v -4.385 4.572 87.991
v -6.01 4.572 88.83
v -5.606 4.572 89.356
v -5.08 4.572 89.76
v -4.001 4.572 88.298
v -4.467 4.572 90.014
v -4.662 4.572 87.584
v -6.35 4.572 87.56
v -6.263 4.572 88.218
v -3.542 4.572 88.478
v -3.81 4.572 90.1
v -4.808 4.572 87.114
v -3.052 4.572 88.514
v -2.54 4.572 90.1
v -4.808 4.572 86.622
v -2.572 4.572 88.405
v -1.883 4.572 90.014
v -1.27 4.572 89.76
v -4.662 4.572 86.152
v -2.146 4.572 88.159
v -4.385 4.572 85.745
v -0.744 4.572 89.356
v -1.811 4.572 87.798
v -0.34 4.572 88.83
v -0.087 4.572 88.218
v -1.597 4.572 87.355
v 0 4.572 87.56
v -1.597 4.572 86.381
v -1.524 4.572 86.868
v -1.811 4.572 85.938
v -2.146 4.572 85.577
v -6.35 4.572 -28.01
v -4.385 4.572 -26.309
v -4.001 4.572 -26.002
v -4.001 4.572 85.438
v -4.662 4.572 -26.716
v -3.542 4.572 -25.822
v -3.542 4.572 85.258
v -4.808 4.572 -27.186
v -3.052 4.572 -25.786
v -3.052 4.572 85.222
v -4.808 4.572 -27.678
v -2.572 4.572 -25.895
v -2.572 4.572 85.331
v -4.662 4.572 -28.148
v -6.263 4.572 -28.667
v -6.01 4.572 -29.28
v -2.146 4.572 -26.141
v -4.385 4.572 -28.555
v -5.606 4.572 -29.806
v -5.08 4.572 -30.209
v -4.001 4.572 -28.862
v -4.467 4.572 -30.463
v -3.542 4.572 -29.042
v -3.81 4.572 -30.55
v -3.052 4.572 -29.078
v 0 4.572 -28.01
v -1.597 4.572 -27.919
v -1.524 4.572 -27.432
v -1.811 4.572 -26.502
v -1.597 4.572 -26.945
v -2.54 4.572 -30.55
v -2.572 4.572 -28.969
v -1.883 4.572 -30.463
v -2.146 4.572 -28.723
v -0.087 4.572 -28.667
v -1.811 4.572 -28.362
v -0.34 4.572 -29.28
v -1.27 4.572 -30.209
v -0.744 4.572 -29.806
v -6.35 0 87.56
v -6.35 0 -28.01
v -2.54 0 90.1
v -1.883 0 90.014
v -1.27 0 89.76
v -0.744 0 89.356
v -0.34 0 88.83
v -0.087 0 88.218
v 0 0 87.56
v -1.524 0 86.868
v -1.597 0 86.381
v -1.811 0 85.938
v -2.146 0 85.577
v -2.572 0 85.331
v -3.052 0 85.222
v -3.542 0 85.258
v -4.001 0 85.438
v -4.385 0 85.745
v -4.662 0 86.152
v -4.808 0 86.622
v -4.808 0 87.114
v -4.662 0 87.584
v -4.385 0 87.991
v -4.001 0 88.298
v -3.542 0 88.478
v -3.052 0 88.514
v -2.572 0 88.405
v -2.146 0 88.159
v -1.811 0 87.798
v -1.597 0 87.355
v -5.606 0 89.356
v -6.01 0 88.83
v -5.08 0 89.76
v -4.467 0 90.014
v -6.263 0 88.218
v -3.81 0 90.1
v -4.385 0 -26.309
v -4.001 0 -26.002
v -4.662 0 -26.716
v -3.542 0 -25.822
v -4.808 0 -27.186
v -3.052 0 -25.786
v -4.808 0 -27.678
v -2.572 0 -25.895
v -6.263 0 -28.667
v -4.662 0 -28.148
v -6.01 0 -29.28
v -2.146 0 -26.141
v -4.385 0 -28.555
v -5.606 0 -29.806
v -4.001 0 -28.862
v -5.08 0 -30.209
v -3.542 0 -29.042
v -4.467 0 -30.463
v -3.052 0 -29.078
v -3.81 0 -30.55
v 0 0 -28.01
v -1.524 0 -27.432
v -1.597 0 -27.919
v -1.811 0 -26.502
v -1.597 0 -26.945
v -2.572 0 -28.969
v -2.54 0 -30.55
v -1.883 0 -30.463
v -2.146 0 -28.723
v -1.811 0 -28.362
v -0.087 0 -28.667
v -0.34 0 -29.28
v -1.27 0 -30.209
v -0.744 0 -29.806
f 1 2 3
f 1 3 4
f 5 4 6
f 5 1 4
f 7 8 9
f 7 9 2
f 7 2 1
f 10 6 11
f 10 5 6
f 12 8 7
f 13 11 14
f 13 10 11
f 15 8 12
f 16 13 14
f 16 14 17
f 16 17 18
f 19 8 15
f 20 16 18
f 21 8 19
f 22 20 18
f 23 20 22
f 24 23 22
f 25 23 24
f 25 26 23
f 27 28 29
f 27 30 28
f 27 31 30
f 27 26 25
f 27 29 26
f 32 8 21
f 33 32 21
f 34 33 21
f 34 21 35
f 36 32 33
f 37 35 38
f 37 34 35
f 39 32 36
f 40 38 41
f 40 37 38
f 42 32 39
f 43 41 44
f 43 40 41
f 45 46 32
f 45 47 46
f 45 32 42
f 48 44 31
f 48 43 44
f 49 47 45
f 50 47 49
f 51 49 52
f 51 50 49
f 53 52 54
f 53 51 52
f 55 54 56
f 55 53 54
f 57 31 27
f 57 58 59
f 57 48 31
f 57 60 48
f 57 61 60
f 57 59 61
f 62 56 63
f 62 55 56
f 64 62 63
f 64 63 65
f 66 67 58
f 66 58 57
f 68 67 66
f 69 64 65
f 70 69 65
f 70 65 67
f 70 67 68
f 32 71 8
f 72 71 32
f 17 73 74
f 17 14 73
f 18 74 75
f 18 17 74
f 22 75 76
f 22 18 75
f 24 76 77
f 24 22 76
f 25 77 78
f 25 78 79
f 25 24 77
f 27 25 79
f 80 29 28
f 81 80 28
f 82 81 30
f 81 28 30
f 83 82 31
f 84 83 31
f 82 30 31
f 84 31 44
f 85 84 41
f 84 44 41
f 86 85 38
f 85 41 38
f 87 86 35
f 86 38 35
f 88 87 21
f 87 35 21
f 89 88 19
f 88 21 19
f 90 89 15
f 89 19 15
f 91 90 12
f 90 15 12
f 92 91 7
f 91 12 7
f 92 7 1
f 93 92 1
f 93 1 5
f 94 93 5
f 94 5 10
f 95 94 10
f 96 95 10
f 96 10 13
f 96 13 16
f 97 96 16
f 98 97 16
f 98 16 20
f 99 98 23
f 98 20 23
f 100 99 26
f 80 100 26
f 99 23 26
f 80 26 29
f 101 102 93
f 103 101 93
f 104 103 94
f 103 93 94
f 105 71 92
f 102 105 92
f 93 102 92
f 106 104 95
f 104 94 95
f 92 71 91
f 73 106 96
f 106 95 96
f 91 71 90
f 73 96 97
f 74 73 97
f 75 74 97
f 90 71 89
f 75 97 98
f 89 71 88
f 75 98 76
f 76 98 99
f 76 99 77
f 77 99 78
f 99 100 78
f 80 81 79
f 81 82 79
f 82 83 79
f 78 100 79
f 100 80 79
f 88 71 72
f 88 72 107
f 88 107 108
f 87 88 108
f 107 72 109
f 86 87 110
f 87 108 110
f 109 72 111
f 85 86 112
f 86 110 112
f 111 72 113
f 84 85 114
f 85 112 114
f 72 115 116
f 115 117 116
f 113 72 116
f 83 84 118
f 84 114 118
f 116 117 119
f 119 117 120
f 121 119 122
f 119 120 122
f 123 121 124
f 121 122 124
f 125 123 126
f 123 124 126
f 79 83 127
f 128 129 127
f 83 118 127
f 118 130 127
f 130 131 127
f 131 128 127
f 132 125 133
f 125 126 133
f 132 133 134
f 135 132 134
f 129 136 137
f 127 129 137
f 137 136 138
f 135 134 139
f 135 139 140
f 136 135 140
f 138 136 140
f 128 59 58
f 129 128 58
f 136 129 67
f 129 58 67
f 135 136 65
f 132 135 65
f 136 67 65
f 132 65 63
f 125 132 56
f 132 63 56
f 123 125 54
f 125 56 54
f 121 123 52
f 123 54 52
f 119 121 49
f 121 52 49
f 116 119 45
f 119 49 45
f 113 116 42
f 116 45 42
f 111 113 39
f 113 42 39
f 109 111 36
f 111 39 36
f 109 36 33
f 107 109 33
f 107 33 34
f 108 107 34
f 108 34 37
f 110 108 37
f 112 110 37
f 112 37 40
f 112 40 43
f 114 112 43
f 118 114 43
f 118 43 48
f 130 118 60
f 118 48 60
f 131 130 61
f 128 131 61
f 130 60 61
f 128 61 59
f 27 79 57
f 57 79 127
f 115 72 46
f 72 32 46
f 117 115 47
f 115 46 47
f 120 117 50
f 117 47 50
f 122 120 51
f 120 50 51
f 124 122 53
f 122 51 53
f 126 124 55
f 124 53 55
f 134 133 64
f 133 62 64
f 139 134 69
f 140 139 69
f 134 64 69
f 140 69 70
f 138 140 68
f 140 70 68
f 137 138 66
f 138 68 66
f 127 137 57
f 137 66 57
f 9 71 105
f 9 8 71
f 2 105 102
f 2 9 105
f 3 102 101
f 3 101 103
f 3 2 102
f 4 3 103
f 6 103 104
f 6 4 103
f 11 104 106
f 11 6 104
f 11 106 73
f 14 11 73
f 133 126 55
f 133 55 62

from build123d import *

# Parameters (mm, degrees)
SKETCH1_W           = 6.35
SKETCH1_H           = 120.65
EXTRUDE_THIN1_DEPTH = 4.572
SKETCH2_R           = 1.651
CUT_EXTRUDE1_DEPTH  = 4.572
LPATTERN1_COUNT     = 6
LPATTERN1_PITCH     = 114.3
FILLET1_R           = 2.54


with BuildPart() as part:
    # Sketch1 → Extrude-Thin1 (new body)
    with BuildSketch(Plane(origin=(0, 0, 0), x_dir=(1, 0, 0), z_dir=(0, 1, 0))):
        with Locations((-3.175, -29.775350058)):
            Rectangle(SKETCH1_W, SKETCH1_H)
    extrude(amount=EXTRUDE_THIN1_DEPTH)

    # Sketch2 → Cut-Extrude1 (cut)
    with BuildSketch(Plane(origin=(0, 4.572, 0), x_dir=(1, 0, 0), z_dir=(0, 1, 0))):
        with Locations((-3.175, 27.432)):
            Circle(SKETCH2_R)
    cut_extrude1 = extrude(amount=-CUT_EXTRUDE1_DEPTH, mode=Mode.SUBTRACT)

    # LPattern1: Cut-Extrude1 ×6
    with Locations(*[(0, 0, i * LPATTERN1_PITCH) for i in range(1, LPATTERN1_COUNT)]):
        add(cut_extrude1, mode=Mode.SUBTRACT)

    # Fillet1
    fillet1_edges = [part.edges().sort_by_distance(p)[0] for p in [
        (-6.35, 2.286, -30.549649942),
        (0, 2.286, -30.549649942),
        (0, 2.286, 90.100350058),
        (-6.35, 2.286, 90.100350058),
    ]]
    fillet(fillet1_edges, radius=FILLET1_R)


solid = part.part
